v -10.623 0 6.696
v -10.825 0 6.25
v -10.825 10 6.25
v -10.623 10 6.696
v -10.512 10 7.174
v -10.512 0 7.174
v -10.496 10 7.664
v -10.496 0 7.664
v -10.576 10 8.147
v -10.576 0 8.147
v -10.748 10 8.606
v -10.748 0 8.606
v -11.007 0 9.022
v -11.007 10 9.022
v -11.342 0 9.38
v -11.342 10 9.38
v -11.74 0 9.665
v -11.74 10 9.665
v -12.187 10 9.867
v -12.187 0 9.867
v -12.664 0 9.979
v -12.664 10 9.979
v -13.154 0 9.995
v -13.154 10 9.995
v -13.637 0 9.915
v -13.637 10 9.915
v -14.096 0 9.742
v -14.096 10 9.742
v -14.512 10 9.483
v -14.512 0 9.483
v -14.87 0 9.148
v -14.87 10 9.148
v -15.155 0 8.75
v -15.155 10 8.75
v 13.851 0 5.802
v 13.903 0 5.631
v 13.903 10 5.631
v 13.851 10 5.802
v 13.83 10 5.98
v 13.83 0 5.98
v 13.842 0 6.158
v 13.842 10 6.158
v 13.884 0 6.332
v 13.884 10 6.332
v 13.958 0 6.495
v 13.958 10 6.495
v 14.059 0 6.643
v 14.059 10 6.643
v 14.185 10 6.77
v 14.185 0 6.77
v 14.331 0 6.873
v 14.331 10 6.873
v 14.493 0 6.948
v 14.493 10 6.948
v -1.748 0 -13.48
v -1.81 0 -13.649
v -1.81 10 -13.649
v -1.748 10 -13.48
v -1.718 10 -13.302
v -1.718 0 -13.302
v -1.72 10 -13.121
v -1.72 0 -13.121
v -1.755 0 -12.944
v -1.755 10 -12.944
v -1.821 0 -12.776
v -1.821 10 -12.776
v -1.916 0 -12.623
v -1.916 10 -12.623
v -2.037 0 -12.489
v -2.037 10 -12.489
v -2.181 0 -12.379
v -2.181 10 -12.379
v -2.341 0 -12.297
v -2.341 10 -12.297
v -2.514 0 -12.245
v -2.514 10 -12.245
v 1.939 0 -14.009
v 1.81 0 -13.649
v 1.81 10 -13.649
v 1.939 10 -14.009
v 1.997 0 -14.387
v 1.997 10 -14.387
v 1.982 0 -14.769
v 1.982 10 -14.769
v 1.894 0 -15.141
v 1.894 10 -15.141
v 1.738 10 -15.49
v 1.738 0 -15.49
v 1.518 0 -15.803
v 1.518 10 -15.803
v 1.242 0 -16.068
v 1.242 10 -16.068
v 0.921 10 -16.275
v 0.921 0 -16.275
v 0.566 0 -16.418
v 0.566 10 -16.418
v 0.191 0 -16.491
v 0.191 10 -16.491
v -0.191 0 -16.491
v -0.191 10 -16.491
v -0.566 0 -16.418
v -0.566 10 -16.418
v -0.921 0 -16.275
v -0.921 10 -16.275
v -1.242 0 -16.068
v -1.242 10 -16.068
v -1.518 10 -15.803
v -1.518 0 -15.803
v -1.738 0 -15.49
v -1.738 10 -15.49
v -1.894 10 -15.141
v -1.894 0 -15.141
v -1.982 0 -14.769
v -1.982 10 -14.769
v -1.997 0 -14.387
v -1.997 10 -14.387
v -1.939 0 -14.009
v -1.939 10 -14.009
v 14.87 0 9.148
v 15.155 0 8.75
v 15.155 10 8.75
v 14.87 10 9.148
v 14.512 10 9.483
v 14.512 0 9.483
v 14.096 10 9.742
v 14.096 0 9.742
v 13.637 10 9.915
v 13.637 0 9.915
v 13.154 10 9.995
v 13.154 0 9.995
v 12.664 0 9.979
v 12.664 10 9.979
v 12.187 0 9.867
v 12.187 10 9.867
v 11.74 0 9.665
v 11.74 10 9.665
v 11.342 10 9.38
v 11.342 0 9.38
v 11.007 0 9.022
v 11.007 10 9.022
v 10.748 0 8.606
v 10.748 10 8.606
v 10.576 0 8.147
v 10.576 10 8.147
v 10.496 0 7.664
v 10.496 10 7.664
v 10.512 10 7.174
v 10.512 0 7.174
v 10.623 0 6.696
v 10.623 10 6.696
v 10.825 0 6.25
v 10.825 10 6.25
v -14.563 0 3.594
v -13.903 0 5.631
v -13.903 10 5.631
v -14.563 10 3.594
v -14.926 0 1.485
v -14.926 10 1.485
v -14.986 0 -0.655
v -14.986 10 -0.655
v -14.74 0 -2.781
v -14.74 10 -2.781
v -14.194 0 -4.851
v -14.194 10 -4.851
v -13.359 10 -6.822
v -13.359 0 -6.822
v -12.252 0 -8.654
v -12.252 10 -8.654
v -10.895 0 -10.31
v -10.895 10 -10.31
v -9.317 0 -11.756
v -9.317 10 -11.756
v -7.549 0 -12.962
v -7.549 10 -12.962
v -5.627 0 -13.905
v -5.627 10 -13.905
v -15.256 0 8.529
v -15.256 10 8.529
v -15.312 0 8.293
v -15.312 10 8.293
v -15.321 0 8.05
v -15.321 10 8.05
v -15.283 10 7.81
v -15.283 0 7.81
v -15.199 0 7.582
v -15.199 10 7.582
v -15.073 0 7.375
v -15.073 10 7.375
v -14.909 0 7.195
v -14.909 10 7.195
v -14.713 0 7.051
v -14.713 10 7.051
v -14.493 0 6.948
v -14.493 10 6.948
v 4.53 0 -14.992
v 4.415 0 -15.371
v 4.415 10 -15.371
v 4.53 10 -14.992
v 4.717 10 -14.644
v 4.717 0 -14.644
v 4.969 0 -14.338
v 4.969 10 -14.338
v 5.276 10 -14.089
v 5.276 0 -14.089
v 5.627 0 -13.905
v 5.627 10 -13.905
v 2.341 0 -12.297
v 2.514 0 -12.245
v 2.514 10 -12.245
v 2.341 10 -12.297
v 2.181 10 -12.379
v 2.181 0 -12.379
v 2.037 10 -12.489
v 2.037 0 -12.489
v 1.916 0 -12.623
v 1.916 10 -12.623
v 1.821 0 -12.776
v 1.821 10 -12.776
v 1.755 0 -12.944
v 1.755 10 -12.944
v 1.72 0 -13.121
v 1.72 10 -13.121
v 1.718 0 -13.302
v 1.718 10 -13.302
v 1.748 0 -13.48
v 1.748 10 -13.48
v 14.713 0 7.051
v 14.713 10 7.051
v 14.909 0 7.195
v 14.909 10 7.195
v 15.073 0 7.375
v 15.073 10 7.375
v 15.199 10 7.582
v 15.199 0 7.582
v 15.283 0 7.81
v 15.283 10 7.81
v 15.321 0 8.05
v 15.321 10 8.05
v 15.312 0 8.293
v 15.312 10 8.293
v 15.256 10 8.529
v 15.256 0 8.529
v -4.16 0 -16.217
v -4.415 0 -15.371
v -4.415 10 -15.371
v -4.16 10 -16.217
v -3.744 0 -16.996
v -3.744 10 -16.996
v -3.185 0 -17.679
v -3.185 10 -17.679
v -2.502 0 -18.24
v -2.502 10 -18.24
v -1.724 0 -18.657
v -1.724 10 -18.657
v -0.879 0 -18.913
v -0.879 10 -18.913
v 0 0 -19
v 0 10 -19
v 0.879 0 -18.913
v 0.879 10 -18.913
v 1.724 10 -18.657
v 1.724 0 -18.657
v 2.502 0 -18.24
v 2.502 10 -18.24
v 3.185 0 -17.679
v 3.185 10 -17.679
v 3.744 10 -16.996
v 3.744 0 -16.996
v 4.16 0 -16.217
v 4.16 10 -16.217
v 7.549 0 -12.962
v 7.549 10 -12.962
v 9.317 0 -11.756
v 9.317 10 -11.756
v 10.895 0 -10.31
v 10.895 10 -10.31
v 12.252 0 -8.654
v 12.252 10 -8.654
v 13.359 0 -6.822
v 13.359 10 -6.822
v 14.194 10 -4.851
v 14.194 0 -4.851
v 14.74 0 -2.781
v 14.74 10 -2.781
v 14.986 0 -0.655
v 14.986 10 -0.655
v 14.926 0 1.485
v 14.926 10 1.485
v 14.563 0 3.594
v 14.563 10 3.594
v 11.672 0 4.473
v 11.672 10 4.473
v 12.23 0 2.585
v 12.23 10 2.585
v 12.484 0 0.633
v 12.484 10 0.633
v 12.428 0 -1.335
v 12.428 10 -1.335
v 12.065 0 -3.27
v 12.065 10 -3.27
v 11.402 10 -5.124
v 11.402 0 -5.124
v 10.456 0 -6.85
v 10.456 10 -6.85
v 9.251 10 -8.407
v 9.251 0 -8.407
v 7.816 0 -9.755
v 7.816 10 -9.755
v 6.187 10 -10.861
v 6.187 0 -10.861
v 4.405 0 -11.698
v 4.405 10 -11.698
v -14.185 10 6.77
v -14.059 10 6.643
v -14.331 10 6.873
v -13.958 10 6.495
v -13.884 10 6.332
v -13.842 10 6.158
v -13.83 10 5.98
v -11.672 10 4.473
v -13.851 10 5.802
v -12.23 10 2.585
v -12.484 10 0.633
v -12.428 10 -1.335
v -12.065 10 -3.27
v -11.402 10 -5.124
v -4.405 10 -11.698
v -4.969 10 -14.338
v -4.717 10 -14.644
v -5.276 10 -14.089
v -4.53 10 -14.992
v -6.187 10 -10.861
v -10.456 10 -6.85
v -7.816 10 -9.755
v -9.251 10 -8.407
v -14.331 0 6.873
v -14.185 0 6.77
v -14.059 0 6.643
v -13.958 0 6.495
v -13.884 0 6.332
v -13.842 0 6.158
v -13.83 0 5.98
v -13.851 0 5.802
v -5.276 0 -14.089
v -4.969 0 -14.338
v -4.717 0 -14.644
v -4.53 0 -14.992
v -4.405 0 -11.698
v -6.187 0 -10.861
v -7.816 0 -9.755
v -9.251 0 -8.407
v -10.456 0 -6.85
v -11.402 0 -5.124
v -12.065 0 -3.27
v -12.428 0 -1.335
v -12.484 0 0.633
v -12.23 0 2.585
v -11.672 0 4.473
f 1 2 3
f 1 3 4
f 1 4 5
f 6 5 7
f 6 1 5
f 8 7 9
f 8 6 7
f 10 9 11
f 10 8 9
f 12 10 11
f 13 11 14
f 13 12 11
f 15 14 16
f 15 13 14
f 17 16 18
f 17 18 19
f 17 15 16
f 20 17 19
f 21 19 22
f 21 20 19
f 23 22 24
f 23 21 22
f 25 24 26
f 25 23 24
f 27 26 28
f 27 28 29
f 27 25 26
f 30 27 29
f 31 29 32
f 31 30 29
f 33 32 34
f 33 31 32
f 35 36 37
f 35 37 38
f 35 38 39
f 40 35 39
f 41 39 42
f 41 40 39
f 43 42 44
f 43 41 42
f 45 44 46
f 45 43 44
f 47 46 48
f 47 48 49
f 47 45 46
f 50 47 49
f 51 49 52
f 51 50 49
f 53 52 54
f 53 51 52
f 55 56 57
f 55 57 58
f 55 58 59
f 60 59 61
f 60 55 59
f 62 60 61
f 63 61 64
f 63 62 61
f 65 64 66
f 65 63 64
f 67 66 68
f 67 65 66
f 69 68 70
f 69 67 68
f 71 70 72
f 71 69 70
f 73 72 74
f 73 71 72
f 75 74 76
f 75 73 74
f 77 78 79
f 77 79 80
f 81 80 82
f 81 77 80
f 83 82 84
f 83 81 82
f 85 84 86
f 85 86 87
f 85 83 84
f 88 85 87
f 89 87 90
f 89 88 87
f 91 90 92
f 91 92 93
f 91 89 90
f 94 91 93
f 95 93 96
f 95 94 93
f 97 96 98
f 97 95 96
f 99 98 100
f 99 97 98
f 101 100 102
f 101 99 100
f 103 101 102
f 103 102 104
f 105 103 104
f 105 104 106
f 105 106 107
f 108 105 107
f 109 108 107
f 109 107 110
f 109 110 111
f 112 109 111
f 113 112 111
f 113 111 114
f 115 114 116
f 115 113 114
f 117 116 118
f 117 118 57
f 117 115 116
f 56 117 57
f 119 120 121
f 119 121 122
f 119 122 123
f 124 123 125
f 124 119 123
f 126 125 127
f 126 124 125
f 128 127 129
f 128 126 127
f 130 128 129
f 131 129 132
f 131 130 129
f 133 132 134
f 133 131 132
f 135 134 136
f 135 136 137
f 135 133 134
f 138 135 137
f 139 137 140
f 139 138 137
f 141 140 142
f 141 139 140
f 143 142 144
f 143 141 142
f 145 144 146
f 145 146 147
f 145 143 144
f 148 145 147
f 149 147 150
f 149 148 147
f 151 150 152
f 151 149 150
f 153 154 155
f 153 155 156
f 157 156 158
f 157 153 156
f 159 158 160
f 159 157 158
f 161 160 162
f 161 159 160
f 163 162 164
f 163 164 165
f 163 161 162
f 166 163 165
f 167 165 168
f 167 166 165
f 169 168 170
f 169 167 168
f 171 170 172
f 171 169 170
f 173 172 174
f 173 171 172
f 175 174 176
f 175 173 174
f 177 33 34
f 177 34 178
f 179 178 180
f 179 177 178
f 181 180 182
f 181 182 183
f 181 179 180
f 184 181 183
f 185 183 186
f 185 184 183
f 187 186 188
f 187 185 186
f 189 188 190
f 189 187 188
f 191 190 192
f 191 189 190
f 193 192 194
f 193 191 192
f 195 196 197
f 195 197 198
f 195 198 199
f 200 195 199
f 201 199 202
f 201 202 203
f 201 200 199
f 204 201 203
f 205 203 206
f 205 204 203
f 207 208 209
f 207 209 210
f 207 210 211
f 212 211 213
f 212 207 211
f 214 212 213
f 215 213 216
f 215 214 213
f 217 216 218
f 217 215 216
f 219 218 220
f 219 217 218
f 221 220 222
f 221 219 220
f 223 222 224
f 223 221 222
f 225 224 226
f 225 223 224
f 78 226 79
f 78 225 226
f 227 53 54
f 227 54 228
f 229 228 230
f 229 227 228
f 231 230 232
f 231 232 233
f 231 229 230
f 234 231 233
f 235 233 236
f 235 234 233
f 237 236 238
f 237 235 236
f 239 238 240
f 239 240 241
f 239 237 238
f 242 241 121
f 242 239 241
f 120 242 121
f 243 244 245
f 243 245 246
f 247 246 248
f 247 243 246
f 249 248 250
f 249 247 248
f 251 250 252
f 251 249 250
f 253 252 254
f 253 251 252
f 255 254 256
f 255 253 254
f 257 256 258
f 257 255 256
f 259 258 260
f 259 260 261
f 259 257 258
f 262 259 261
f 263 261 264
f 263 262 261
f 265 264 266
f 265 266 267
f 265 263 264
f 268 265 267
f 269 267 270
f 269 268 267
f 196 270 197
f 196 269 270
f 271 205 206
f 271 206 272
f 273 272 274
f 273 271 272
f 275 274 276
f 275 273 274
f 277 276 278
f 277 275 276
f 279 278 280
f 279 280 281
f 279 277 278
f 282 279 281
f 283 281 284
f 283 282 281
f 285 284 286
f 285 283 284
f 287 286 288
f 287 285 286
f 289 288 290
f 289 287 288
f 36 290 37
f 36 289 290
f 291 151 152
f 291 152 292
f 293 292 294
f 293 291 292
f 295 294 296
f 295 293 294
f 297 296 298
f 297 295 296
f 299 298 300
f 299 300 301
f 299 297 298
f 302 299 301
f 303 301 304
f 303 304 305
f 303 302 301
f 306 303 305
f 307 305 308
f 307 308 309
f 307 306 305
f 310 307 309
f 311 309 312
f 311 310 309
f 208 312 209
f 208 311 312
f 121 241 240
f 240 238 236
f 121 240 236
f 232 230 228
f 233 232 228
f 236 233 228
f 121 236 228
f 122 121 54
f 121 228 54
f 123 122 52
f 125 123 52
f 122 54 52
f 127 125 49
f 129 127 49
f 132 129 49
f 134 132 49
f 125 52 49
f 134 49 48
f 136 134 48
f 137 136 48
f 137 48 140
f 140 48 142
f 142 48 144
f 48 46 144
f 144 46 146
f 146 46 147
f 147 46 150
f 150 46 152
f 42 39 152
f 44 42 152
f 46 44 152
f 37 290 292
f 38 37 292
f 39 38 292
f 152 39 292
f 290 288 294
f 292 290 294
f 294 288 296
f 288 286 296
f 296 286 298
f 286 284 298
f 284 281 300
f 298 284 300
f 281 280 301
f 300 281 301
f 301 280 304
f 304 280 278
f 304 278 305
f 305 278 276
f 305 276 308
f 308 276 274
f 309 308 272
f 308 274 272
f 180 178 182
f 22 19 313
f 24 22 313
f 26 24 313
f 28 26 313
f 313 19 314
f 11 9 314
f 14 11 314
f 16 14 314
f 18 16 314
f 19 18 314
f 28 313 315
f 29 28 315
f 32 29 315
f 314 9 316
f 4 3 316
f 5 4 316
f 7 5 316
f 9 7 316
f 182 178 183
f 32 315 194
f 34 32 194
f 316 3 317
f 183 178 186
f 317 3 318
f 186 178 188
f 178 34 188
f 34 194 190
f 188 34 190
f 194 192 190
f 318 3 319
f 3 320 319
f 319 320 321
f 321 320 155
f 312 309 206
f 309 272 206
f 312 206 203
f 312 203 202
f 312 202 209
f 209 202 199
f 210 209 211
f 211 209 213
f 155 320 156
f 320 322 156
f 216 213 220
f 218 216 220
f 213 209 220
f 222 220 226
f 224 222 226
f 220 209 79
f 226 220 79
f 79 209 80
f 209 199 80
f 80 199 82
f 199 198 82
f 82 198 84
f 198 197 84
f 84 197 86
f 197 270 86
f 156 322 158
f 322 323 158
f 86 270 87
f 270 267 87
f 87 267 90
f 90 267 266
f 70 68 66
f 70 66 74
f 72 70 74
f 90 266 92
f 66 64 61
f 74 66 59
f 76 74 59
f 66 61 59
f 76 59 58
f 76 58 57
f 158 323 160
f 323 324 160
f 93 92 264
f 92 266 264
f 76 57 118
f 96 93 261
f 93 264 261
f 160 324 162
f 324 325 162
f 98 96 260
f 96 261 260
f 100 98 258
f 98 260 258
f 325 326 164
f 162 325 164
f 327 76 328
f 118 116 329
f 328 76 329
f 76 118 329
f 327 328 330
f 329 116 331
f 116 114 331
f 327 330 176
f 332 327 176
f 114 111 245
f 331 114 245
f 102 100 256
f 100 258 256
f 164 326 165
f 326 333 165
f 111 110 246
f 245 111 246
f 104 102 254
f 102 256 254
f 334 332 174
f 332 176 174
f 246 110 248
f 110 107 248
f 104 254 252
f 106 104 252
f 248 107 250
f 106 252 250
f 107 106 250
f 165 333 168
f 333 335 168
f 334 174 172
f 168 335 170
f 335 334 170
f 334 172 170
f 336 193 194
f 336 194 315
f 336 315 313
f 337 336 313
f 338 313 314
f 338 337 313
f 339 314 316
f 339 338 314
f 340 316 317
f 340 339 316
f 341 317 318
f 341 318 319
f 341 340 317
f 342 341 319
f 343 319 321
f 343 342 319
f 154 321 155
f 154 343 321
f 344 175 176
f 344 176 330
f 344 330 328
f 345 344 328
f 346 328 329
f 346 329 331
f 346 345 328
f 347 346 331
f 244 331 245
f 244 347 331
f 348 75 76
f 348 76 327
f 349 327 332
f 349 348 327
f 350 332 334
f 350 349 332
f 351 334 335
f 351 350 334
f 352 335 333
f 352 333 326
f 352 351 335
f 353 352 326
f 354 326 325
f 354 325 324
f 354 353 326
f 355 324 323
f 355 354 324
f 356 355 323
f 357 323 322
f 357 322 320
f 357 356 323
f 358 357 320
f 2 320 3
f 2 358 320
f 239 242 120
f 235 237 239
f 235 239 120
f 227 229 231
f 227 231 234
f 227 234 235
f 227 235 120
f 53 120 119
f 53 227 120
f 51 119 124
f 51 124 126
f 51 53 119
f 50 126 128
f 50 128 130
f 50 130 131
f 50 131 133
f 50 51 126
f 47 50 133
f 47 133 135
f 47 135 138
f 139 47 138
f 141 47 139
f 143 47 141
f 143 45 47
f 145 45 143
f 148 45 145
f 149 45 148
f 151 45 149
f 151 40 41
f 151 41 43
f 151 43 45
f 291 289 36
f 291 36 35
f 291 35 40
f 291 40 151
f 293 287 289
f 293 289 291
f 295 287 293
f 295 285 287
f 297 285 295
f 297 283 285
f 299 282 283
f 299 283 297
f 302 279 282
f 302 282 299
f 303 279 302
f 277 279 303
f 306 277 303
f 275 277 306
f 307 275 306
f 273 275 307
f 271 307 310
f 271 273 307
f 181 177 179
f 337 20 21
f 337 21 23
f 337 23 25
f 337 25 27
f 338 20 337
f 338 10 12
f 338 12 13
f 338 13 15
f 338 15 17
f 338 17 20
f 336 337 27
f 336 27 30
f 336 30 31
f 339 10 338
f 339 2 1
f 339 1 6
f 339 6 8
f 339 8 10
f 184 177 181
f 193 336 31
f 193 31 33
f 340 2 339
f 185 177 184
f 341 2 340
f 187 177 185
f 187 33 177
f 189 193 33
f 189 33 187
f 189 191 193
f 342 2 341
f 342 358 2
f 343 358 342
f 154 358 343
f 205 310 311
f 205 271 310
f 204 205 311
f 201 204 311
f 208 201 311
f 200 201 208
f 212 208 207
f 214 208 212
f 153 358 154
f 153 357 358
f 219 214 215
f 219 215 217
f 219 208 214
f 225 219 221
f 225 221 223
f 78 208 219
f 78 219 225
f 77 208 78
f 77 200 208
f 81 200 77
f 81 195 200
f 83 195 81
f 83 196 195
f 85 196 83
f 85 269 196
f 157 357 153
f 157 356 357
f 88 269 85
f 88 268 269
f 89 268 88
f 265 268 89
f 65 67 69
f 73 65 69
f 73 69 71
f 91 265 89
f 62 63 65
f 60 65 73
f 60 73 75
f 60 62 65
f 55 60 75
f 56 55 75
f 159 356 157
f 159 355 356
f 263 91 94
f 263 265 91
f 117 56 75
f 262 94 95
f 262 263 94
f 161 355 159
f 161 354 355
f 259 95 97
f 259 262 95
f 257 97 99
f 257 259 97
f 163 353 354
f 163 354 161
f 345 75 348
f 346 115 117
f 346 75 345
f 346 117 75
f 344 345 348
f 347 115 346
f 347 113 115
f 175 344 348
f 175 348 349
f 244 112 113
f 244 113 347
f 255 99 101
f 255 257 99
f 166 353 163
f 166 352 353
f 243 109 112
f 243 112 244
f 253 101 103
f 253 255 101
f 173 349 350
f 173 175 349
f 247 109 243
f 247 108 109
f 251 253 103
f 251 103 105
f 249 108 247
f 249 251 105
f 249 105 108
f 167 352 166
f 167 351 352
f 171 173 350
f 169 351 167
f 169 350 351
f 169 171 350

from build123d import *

# Parameters (mm, degrees)
SKETCH2_R               = 10.5
BOSS_EXTRUDE1_DEPTH     = 42
SKETCH3_R               = 12.5
BOSS_EXTRUDE2_DEPTH     = 4
SKETCH4_R               = 2.5
CUT_EXTRUDE1_DEPTH      = 12
CUT_EXTRUDE2_DEPTH      = 6
SKETCH6_R               = 12.5
SKETCH6_R_2             = 3.35
BOSS_EXTRUDE3_DEPTH     = 1
SKETCH8_W               = 3
SKETCH8_H               = 0.5
SKETCH8_W_2             = 0.5
SKETCH8_H_2             = 3
BOSS_EXTRUDE4_DEPTH     = 42
CHAMFER1_SIZE           = 1
CUT_EXTRUDE3_DEPTH      = 51.214539727
CUT_EXTRUDE3_DEPTH_BACK = 51.214539727
SKETCH7_R               = 3.5
BOSS_EXTRUDE11_DEPTH    = 10


with BuildPart() as part:
    # Sketch2 → Boss-Extrude1 (new body)
    with BuildSketch(Plane(origin=(0, 0, 0), x_dir=(1, 0, 0), z_dir=(0, 1, 0))):
        with Locations(Location((0, 0, 0), (0, 0, 90))):
            Circle(SKETCH2_R)
    extrude(amount=BOSS_EXTRUDE1_DEPTH)

    # Sketch3 → Boss-Extrude2 (add)
    with BuildSketch(Plane(origin=(0, 42, 0), x_dir=(1, 0, 0), z_dir=(0, 1, 0))):
        with Locations(Location((0, 0, 0), (0, 0, 270))):
            Circle(SKETCH3_R)
    extrude(amount=BOSS_EXTRUDE2_DEPTH)

    # Sketch4 → Cut-Extrude1 (cut)
    with BuildSketch(Plane(origin=(0, 46, 0), x_dir=(1, 0, 0), z_dir=(0, 1, 0))):
        with Locations(Location((0, 0, 0), (0, 0, 270))):
            Circle(SKETCH4_R)
    extrude(amount=-CUT_EXTRUDE1_DEPTH, mode=Mode.SUBTRACT)

    # Sketch5 → Cut-Extrude2 (cut)
    with BuildSketch(Plane.XZ.offset(-35)):
        Polygon((-4.734272207, 0), (-2.367136104, -4.1), (2.367136104, -4.1), (4.734272207, 0), (2.367136104, 4.1), (-2.367136104, 4.1), align=None)
    extrude(amount=-CUT_EXTRUDE2_DEPTH, mode=Mode.SUBTRACT)

    # Sketch6 → Boss-Extrude3 (add)
    with BuildSketch(Plane(origin=(0, 46, 0), x_dir=(1, 0, 0), z_dir=(0, 1, 0))):
        with Locations(Location((0, 0, 0), (0, 0, 270))):
            Circle(SKETCH6_R)
        with Locations(Location((0, 0, 0), (0, 0, 270))):
            Circle(SKETCH6_R_2, mode=Mode.SUBTRACT)
    extrude(amount=BOSS_EXTRUDE3_DEPTH)

    # Sketch8 → Boss-Extrude4 (add)
    with BuildSketch(Plane.XZ):
        Polygon((6.541030619, 8.662765176), (8.662350963, 6.541444833), (8.308797572, 6.187891442), (6.187477229, 8.309211786), align=None)
        with Locations((0, 10.5)):
            Rectangle(SKETCH8_W, SKETCH8_H)
        with Locations((10.501, 0.001)):
            Rectangle(SKETCH8_W_2, SKETCH8_H_2)
        Polygon((8.663765176, -6.540030619), (6.542444833, -8.661350963), (6.188891442, -8.307797572), (8.310211786, -6.186477229), align=None)
        with Locations((0.002, -10.5)):
            Rectangle(SKETCH8_W, SKETCH8_H)
        Polygon((-6.539030619, -8.662765176), (-8.660350963, -6.541444833), (-8.306797572, -6.187891442), (-6.185477229, -8.309211786), align=None)
        with Locations((-10.499, -0.001)):
            Rectangle(SKETCH8_W_2, SKETCH8_H_2)
        Polygon((-8.661765176, 6.540030619), (-6.540444833, 8.661350963), (-6.186891442, 8.307797572), (-8.308211786, 6.186477229), align=None)
    extrude(amount=-BOSS_EXTRUDE4_DEPTH)

    # Chamfer1
    chamfer1_edges = [part.edges().sort_by_distance(p)[0] for p in [
        (-4.016445773, 0, -9.70145161),
        (-1.498, 0, -10.571296662),
        (0.002, 0, -10.75),
        (1.502, 0, -10.571007987),
        (-9.700211661, 0, -4.019439479),
        (-8.534223693, 0, -6.415317563),
        (-7.599690791, 0, -7.602105005),
        (-6.412729118, 0, -8.536463676),
        (-9.700985019, 0, 4.017572607),
        (-10.570724567, 0, 1.499),
        (-10.749, 0, -0.001),
        (-10.570580229, 0, -1.501),
        (-4.01831274, 0, 9.700678467),
        (-6.414245443, 0, 8.535151573),
        (-7.601105005, 0, 7.600690791),
        (-8.535535893, 0, 6.413801336),
        (4.018039338, 0, 9.700791714),
        (1.5, 0, 10.571152423),
        (0, 0, 10.75),
        (-1.5, 0, 10.571152423),
        (9.700485123, 0, 4.018779463),
        (8.535651573, 0, 6.414745443),
        (7.601690791, 0, 7.602105005),
        (6.414301336, 0, 8.536035893),
        (9.701258362, 0, -4.01691252),
        (10.571724567, 0, -1.499),
        (10.751, 0, 0.001),
        (10.571580229, 0, 1.501),
        (4.019906186, 0, -9.700018261),
        (6.415817563, 0, -8.534723693),
        (7.603105005, 0, -7.600690791),
        (8.536963676, 0, -6.413229118),
    ]]
    chamfer(chamfer1_edges, length=CHAMFER1_SIZE)

    # Sketch7 → Cut-Extrude3 (cut, two sides: drawn at the far end of the back side and taken through both)
    with BuildSketch(Plane(origin=(0, 0, 0), x_dir=(0, 0, -1), z_dir=(1, 0, 0)).offset(-CUT_EXTRUDE3_DEPTH_BACK)):
        with Locations(Location((0, 17, 0), (0, 0, 64.604946599))):
            Circle(SKETCH7_R)
    extrude(amount=CUT_EXTRUDE3_DEPTH + CUT_EXTRUDE3_DEPTH_BACK, mode=Mode.SUBTRACT)


with BuildPart() as body_2:
    # Sketch36 → Boss-Extrude11 (new body)
    with BuildSketch(Plane(origin=(0, 0, 0), x_dir=(1, 0, 0), z_dir=(0, 1, 0))):
        with BuildLine():
            ThreePointArc((10.825317547, -6.25), (11.401622185, 5.123769272), (2.514051045, 12.244572158))
            ThreePointArc((2.514051045, 12.244572158), (1.821132072, 12.77615689), (1.810116753, 13.649425287))
            ThreePointArc((1.810116753, 13.649425287), (0, 16.5), (-1.810116753, 13.649425287))
            ThreePointArc((-1.810116753, 13.649425287), (-1.821132072, 12.77615689), (-2.514051045, 12.244572158))
            ThreePointArc((-2.514051045, 12.244572158), (-11.401622185, 5.123769272), (-10.825317547, -6.25))
            ThreePointArc((-10.825317547, -6.25), (-11.740381057, -9.665063509), (-15.155444566, -8.75))
            ThreePointArc((-15.155444566, -8.75), (-15.246255337, -7.69399267), (-14.493462435, -6.947868736))
            ThreePointArc((-14.493462435, -6.947868736), (-13.917395246, -6.415225062), (-13.903033251, -5.630778491))
            ThreePointArc((-13.903033251, -5.630778491), (-13.811642586, 5.851369845), (-5.626747062, 13.904665314))
            ThreePointArc((-5.626747062, 13.904665314), (-4.835213091, 14.484668262), (-4.41483231, 15.371352785))
            ThreePointArc((-4.41483231, 15.371352785), (0, 19), (4.41483231, 15.371352785))
            ThreePointArc((4.41483231, 15.371352785), (4.835213091, 14.484668262), (5.626747062, 13.904665314))
            ThreePointArc((5.626747062, 13.904665314), (13.811642586, 5.851369845), (13.903033251, -5.630778491))
            ThreePointArc((13.903033251, -5.630778491), (13.917395246, -6.415225062), (14.493462435, -6.947868736))
            ThreePointArc((14.493462435, -6.947868736), (15.246255337, -7.69399267), (15.155444566, -8.75))
            ThreePointArc((15.155444566, -8.75), (11.740381057, -9.665063509), (10.825317547, -6.25))
        make_face()
    extrude(amount=BOSS_EXTRUDE11_DEPTH)


solid = body_2.part
